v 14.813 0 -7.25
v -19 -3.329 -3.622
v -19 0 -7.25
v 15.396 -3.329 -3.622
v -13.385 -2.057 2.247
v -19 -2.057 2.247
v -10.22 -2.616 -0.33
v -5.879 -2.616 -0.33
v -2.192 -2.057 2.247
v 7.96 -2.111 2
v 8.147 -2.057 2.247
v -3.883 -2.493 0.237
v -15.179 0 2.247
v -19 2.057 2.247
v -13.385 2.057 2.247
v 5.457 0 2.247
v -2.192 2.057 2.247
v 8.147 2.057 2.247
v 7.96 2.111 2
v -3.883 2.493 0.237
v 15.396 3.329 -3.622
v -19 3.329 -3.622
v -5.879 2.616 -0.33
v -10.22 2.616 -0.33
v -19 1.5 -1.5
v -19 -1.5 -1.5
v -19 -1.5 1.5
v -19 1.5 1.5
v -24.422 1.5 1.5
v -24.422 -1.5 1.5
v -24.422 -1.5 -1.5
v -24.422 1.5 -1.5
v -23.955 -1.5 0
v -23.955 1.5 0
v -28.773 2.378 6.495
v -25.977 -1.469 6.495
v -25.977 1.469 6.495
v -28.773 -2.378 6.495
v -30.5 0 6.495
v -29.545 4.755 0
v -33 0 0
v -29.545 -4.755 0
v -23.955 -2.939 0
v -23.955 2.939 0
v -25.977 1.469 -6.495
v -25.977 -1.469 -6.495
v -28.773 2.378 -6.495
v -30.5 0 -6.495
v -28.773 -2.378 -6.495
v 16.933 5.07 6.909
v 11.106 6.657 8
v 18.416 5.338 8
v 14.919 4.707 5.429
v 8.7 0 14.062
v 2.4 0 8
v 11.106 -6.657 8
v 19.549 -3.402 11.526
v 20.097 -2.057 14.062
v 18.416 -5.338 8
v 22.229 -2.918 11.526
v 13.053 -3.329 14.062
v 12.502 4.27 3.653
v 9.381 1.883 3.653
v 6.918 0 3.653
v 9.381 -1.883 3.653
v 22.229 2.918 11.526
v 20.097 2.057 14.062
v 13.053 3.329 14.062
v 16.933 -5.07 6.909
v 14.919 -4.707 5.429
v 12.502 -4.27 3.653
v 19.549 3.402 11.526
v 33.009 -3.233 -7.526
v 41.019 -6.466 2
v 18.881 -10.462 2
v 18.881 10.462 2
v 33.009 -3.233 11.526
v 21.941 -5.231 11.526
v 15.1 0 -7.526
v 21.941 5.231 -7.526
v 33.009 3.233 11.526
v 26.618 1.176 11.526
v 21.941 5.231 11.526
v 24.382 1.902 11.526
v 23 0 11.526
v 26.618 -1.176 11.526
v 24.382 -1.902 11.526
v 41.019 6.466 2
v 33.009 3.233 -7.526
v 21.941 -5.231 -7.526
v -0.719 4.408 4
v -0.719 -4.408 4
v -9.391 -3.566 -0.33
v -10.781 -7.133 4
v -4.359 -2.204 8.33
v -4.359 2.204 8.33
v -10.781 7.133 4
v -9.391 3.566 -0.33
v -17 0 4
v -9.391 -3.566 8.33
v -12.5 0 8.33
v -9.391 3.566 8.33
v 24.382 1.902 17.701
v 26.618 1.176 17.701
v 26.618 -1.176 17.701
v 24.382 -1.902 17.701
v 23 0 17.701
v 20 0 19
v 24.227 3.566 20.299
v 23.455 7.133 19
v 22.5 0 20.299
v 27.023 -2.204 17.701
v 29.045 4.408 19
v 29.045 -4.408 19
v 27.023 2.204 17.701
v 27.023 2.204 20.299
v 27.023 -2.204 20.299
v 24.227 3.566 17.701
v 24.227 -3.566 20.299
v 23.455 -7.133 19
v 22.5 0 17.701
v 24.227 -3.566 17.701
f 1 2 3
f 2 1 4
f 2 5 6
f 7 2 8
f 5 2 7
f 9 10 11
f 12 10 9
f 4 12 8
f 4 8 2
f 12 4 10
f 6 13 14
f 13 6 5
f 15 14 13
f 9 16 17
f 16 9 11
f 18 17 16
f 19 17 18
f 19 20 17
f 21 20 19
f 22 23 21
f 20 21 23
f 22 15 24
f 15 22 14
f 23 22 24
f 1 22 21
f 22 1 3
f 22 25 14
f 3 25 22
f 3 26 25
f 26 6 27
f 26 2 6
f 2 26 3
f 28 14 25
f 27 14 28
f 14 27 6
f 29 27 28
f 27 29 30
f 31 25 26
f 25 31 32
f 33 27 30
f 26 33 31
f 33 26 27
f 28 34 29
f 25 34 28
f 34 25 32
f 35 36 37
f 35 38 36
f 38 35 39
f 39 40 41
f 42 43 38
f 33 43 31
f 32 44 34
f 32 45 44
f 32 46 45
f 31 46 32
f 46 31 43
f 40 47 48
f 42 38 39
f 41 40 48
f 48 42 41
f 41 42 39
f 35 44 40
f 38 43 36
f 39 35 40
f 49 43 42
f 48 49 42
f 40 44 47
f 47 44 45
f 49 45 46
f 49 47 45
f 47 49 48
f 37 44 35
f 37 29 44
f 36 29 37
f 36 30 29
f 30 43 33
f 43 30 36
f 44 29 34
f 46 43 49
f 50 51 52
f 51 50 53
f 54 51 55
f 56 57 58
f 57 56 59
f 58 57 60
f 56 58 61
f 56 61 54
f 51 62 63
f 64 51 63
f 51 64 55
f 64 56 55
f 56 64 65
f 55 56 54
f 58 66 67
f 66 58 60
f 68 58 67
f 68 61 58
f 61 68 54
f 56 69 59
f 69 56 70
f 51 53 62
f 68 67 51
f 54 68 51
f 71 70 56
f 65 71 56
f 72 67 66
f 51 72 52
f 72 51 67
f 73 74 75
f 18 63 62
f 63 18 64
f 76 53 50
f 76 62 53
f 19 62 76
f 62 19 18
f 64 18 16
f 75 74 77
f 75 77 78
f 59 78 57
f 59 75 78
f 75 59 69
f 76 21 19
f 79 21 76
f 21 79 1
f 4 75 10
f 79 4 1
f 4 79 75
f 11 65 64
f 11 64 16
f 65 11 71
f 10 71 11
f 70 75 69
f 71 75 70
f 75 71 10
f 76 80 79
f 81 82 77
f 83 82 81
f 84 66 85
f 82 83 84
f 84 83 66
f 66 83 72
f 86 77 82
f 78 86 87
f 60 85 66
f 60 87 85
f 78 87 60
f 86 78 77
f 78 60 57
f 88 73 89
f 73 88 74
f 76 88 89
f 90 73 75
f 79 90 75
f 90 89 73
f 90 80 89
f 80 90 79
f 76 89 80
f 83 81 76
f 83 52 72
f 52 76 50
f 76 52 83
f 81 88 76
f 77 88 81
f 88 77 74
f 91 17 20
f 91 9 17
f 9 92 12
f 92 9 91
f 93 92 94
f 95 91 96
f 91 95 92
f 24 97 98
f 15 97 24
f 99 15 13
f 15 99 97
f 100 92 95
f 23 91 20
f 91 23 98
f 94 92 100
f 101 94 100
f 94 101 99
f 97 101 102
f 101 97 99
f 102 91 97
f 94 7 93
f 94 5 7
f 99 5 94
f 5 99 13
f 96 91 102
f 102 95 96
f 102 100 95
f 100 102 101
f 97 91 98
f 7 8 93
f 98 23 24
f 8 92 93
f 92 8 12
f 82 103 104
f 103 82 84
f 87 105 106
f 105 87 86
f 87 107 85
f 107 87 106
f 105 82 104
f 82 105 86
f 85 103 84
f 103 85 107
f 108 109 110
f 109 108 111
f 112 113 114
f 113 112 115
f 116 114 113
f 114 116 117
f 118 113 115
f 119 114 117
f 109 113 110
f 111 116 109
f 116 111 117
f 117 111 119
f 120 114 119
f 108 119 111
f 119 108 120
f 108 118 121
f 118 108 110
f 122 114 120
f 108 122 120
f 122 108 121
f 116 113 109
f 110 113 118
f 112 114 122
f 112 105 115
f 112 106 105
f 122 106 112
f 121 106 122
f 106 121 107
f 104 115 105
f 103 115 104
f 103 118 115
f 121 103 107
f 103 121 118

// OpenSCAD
module transport()
{
	union() {
		translate(v = [0, 0, -2])
			scale(v = [1, 1, 1.5])
				rotate(a = 90, v = [0, 1, 0])
					cylinder(h = 38, r1 = 3.5, r2 = 3.5, center = true);
		translate(v = [20, 0, 0])
			cube(size = [20, 3, 3], center = true);
		translate(v = [28, 0, 0])
			scale(v = [1, 1, 1.5])
				sphere(r = 5);
		translate(v = [-15, 0, 8])
			scale(v = [1.8, 1, 1])
				sphere(r = 7);
			translate(v = [-25, 0, 2])
			scale(v = [1.8, 1, 1])
				sphere(r = 11);
		translate(v = [8, 0, 4])
			scale(v = [1.8, 1.5, 1])
				sphere(r = 5);
		translate(v = [-25, 0, 10])
			cylinder(h = 20, r1 = 2, r2 = 2, center = true);
		translate(v = [-25, 0, 19])
			scale(v = [1, 1.5, 0.3])
				sphere(r = 5);
	}
}

$fn = 5;
rotate(a = 180, v = [0, 0, 1])
	transport();
